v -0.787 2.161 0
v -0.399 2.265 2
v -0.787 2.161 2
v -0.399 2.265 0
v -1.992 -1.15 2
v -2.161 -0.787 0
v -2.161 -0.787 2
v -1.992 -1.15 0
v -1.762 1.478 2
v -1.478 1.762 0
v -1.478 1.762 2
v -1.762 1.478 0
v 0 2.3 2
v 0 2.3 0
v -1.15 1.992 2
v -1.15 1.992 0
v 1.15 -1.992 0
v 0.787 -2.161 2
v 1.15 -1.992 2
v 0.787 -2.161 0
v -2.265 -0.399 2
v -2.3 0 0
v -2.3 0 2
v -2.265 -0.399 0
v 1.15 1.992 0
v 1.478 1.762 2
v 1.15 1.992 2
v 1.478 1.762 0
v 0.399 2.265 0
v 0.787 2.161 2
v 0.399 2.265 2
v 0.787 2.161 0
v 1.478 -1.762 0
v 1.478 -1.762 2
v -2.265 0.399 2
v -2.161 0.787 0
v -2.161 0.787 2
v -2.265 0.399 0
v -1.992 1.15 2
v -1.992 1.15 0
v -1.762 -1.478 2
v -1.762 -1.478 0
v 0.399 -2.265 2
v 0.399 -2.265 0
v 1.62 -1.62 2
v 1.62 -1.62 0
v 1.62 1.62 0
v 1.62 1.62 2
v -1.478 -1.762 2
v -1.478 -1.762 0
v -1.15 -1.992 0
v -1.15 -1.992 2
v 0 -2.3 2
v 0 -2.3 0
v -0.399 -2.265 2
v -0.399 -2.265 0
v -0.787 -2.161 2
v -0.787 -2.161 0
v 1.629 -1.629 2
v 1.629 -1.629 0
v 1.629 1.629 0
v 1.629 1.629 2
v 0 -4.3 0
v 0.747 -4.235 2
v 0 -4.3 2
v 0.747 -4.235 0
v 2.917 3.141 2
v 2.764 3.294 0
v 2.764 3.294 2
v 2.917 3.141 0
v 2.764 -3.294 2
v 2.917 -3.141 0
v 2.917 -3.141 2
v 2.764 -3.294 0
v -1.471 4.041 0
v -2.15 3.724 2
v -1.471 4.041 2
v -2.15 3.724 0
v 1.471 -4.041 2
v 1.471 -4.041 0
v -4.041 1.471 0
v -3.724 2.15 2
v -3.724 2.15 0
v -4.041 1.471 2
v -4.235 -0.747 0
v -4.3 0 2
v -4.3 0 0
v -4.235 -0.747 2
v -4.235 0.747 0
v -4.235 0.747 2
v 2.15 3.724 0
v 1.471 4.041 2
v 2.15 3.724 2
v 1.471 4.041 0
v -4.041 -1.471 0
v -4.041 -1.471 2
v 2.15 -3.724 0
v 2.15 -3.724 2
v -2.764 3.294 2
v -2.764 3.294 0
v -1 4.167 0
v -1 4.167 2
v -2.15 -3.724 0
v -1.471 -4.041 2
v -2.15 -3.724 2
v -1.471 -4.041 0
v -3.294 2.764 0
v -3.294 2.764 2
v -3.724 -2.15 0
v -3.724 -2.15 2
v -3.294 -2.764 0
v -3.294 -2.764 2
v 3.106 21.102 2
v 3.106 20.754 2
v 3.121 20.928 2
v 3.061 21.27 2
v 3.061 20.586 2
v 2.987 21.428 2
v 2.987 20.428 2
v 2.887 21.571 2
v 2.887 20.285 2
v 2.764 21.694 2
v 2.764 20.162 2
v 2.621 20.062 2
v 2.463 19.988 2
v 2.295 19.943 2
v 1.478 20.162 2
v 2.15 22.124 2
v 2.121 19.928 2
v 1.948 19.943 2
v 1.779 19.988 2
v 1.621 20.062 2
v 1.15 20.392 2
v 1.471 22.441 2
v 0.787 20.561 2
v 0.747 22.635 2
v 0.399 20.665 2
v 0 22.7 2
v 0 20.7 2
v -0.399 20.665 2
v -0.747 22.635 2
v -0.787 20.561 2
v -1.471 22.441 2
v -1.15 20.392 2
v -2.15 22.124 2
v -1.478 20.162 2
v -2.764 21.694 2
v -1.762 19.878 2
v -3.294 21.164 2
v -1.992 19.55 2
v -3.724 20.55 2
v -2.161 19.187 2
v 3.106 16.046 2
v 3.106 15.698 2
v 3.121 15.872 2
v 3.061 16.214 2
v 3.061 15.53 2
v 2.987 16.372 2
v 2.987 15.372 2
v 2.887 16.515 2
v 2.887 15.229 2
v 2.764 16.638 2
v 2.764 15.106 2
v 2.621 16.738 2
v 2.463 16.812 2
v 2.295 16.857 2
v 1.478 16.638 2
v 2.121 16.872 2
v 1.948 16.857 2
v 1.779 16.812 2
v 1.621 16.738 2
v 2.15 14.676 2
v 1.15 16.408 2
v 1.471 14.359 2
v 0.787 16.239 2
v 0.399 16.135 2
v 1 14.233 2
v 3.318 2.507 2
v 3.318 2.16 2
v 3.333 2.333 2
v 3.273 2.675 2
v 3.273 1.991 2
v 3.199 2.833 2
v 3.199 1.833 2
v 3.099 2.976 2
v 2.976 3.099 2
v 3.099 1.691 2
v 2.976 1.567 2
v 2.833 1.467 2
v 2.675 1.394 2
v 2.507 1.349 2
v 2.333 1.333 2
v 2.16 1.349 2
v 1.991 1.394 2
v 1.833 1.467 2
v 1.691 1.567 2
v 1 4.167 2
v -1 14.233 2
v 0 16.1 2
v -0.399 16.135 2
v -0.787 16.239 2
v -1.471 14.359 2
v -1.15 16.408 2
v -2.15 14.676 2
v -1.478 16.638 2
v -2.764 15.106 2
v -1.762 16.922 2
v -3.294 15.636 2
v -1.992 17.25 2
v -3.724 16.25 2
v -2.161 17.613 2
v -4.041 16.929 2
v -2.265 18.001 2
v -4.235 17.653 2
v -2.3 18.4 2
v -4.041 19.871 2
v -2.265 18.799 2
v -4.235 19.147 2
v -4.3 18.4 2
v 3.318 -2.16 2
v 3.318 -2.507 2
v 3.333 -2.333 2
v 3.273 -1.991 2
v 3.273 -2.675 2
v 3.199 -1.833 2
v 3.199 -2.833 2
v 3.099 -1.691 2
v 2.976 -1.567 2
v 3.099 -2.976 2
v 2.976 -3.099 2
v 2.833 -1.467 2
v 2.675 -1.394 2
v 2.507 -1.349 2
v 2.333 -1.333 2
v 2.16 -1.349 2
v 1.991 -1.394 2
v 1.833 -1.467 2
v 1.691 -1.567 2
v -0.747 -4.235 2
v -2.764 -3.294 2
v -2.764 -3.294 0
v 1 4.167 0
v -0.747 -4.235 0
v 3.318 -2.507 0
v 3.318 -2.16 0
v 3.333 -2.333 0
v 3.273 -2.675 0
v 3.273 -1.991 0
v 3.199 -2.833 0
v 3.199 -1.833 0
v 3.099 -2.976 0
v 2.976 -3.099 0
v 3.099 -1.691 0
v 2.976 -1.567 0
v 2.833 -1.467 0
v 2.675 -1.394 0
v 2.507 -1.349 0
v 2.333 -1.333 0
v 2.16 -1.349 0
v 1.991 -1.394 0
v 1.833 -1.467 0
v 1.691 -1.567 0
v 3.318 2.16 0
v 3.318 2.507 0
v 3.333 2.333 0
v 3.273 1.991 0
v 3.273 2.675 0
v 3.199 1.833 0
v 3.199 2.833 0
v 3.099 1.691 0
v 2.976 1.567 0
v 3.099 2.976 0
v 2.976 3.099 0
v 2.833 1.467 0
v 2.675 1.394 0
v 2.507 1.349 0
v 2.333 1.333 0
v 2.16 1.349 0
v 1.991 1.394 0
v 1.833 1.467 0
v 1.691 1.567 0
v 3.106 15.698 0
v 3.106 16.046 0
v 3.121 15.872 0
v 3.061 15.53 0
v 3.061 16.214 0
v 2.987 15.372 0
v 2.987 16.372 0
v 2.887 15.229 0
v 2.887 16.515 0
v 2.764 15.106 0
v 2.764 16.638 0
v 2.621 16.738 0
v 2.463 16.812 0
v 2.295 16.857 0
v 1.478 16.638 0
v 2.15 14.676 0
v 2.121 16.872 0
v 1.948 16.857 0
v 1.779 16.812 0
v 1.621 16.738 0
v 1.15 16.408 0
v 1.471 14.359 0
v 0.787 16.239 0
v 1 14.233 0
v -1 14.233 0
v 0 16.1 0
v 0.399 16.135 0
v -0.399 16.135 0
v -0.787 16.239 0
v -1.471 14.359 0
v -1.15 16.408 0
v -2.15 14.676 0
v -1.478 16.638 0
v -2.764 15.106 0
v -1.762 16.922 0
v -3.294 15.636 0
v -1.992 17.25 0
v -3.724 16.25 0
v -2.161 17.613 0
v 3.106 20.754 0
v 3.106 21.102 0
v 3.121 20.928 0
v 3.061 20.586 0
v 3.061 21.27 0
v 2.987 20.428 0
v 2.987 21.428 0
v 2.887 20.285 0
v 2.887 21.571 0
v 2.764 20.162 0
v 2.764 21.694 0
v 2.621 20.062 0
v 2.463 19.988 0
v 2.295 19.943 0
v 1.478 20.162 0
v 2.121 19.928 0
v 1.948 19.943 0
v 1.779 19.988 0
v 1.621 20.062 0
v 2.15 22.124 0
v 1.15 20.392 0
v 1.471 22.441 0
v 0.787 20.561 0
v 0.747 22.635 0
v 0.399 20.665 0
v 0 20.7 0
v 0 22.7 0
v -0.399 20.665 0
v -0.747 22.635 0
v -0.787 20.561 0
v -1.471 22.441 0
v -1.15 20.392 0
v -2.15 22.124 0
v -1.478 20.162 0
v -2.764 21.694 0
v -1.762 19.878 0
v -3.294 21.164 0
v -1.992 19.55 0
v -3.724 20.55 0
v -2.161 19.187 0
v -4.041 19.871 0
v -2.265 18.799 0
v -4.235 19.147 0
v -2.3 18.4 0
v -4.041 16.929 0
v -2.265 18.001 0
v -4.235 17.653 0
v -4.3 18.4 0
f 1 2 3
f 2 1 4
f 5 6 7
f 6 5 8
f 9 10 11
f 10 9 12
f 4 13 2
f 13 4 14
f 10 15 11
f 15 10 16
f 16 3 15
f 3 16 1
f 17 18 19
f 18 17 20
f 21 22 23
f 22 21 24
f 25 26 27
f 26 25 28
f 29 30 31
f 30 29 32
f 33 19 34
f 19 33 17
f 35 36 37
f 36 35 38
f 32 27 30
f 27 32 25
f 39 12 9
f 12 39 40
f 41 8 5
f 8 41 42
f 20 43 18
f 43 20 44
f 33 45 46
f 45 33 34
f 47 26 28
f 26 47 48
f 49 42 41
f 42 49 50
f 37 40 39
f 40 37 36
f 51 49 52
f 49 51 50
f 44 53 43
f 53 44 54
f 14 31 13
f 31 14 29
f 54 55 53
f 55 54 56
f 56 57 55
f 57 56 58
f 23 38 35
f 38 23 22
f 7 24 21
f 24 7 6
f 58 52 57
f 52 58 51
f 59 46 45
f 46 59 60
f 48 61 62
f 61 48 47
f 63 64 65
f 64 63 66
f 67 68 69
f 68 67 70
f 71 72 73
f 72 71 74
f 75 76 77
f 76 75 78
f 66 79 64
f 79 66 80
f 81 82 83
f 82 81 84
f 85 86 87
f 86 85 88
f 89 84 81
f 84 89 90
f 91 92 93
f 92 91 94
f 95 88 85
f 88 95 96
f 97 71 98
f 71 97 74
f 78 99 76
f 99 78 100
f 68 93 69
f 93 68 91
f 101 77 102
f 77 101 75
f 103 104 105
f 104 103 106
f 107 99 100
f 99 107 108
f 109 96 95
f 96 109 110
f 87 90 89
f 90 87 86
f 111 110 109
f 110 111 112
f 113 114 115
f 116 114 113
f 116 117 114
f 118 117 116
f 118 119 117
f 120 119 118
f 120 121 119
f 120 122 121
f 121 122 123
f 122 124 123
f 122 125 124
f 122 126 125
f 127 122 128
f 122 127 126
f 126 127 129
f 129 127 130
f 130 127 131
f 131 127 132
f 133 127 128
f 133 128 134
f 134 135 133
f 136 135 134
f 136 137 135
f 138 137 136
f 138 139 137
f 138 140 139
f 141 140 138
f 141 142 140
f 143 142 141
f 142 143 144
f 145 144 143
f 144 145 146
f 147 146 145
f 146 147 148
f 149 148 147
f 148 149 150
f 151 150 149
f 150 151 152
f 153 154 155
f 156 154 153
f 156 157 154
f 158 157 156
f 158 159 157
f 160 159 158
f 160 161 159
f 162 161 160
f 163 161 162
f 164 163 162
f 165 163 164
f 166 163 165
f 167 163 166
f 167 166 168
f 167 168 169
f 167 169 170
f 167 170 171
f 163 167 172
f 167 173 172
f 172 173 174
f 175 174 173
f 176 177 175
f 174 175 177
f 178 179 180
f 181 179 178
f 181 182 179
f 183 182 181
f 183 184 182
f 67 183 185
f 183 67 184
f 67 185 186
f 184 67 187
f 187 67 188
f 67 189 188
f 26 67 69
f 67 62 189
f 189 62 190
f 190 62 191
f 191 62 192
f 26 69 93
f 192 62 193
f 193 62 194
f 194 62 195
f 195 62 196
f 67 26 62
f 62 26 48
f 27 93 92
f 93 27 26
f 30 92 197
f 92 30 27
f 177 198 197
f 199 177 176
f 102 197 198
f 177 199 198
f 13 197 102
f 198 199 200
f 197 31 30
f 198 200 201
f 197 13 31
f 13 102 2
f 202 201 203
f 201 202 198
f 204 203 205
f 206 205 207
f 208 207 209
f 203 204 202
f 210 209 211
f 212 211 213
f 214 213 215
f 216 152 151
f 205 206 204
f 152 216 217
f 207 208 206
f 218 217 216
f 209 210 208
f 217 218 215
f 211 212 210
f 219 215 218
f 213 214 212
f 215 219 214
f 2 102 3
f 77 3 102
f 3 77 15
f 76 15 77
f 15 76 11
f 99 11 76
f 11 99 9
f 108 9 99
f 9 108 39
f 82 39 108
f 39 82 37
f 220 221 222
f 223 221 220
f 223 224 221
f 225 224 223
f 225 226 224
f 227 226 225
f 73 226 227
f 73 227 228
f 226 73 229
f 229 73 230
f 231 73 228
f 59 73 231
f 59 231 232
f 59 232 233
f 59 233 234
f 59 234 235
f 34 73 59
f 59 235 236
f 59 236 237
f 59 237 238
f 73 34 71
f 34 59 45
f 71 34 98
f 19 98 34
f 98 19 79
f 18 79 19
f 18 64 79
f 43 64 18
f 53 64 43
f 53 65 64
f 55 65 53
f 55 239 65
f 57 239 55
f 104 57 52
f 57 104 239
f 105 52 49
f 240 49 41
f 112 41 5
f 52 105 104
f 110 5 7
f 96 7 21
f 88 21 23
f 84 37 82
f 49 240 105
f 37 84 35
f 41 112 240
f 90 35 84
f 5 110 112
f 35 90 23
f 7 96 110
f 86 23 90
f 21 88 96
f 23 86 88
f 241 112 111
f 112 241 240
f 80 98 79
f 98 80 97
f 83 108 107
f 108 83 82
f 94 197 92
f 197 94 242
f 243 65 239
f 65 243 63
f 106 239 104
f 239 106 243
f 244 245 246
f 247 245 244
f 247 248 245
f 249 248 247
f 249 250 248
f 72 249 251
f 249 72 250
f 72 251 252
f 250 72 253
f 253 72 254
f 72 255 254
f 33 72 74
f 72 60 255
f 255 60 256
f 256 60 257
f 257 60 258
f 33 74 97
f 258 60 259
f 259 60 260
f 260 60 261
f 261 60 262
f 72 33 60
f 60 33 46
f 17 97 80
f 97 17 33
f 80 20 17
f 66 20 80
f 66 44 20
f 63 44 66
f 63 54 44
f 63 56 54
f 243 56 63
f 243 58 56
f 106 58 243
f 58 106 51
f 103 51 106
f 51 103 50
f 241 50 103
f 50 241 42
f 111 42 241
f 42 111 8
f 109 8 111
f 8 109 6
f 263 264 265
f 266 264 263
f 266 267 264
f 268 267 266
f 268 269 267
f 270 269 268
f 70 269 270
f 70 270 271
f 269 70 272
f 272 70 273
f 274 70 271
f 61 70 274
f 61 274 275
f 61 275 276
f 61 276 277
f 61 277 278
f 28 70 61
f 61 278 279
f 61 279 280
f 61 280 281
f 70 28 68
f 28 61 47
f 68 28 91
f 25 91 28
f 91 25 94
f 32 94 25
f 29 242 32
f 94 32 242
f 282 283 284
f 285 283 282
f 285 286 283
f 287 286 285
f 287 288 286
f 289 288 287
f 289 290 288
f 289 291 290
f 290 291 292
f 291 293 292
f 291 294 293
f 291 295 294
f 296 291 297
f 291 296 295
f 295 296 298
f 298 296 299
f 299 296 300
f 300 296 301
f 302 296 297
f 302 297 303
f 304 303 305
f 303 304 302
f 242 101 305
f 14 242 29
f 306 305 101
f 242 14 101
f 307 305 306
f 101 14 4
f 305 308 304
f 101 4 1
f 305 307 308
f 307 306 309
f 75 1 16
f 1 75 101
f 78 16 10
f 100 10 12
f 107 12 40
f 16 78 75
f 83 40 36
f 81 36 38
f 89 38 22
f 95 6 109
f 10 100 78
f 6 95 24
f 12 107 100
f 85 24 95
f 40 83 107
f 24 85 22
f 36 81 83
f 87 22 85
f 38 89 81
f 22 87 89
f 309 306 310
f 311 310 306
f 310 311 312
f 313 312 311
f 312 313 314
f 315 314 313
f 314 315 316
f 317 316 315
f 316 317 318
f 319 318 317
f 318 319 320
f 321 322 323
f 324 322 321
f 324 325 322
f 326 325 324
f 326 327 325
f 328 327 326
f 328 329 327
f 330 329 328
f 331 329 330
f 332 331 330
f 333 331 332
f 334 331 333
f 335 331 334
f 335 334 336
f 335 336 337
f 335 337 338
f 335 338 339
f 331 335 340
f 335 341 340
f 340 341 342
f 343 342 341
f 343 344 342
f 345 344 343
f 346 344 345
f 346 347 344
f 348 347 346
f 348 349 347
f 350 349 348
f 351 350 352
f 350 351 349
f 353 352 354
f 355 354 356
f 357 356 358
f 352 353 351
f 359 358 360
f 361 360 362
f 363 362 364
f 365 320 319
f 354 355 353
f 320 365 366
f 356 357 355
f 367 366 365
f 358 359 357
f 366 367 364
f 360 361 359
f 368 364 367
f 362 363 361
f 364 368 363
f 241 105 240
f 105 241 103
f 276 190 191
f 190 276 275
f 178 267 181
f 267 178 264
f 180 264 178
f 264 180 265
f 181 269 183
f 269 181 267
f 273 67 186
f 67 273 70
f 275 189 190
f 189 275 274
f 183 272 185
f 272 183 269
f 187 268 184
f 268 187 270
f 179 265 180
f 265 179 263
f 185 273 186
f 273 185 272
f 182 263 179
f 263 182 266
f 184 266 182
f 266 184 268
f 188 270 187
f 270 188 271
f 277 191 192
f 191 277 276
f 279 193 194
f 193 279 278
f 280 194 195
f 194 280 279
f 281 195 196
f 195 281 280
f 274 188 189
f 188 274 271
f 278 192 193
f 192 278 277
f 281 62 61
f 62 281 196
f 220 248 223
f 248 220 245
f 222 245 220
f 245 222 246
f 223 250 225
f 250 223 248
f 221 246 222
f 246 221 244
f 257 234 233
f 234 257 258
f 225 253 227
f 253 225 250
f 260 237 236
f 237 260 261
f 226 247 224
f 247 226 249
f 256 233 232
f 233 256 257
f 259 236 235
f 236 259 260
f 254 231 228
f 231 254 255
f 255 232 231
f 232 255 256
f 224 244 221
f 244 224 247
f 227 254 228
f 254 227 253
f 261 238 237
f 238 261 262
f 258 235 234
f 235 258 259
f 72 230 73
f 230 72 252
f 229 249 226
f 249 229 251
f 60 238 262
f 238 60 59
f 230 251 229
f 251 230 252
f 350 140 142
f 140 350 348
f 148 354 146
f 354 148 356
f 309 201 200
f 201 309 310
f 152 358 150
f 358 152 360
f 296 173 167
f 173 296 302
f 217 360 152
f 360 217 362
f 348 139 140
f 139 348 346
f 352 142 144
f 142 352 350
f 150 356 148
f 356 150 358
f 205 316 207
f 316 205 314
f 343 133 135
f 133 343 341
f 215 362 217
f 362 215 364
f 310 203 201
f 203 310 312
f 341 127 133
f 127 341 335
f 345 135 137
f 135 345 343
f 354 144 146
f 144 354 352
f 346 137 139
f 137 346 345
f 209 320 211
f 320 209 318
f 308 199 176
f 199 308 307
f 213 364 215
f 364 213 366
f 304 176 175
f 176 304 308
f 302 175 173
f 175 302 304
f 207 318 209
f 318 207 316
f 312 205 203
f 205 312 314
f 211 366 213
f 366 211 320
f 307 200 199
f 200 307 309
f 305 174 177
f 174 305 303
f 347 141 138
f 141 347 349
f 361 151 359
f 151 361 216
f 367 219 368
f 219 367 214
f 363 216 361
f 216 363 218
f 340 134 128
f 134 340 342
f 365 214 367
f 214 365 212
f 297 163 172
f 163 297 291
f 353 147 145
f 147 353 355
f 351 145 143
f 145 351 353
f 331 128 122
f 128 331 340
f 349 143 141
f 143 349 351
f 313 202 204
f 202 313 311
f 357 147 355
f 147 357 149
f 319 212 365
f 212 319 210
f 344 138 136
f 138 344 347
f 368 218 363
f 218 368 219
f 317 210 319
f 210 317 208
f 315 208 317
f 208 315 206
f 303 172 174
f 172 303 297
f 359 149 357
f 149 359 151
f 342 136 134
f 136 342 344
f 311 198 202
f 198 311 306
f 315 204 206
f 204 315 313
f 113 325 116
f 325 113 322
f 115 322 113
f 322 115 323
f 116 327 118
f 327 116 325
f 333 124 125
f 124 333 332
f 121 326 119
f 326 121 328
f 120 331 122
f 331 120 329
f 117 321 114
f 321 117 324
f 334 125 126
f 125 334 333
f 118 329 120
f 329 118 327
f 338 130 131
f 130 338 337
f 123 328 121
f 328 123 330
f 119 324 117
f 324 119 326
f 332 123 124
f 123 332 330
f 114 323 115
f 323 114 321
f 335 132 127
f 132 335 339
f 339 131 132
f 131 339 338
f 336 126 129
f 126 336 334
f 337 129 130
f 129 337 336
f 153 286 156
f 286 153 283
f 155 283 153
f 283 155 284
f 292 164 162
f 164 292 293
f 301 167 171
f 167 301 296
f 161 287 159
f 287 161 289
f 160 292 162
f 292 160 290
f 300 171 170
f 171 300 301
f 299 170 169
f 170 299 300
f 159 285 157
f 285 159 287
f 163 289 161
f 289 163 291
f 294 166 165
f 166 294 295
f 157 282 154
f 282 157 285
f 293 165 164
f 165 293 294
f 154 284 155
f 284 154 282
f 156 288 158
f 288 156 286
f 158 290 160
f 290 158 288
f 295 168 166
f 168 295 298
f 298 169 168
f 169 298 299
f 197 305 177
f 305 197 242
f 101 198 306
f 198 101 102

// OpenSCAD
// joiner
// @author Ilya Protasov

betweenCenters = 23 - 4.6;
inDiameter = 4.6;
outDiameter = 8.6;
thickness = 2;
barThickness = 2;
barWidth = 2;

$fn = 36;
//Indigo DeepSkyBlue YellowGreen DeepPink OrangeRed LawnGreen DarkSlateBlue Magenta

//function boundDist(blockCount) = cell * blockCount - gap;


module branch1() {
    translate([-thicknessA/2, 0, 0]) cube([thicknessA, radius, height], false);
    translate([0, radius, 0])  cylinder(height, thicknessA/2, thicknessA/2, false);
    translate([0, radius*0.4, 0]) rotate([0, 0, 60]) branch2();
    translate([0, radius*0.4, 0]) rotate([0, 0, -60]) branch2();
}

module clip(thickness, inD, outD, gapAngle) {
    outR = outD/2;
    inR = inD/2;
    centerR = inR + (outR - inR)/2;
    halfA = gapAngle/2;
    
    /*points = [
        [0, 0], 
        [outD * cos(90 + gapAngle/2), -outD * sin(gapAngle/2 + 90)], 
        [-outD * cos(90 +gapAngle/2), -outD * sin(gapAngle/2 + 90)]
    ];*/
    points = [
        [0, 0], 
        [outR * cos(halfA), outR * sin(halfA)], 
        [outR * cos(halfA), -outR * sin(halfA)]
    ];
    x1 = outR * sin(halfA);
    y1 = outR * cos(halfA);
    x2 = x1 * outR / y1;
    // x is changed with y because 0 angle is X-axis
    points2 = [
        [0, 0], 
        [outR, -x2], 
        [outR, x2]
    ];
    difference() {
        cylinder(thickness, outR, outR, false);
        translate([0, 0, -thickness/2]) {
            cylinder(thickness*2, inR, inR, false);
            color("Magenta") linear_extrude(5) polygon(points2);
        }
    }
    roundingR = (outR - inR) / 2;
    translate([centerR * cos(halfA), centerR * sin(halfA)]) 
        cylinder(h = thickness, r = roundingR);//, $fn = 24
    translate([centerR * cos(halfA), -centerR * sin(halfA)]) 
        cylinder(h = thickness, r = roundingR);
    //color("LawnGreen") linear_extrude(10) polygon(points);
    //color("Magenta") linear_extrude(5) polygon(points2);
}

module bar(thickness, length, width, holeD) {
    holeR = holeD / 2;
    difference() {
        translate([-width/2, 0, 0]) 
            cube([width, length, thickness], false);
        union() {
            translate([0, 0, -thickness/2])
                cylinder(h = thickness*2, r = holeR);
            translate([0, length, -thickness/2])
                cylinder(h = thickness*2, r = holeR);
        }
    }
    *translate([0, 0, -thickness/2])
        cylinder(h = thickness*2, r = holeR);
}

module joiner1() {
    //A
    clip(thickness, inDiameter, outDiameter, 90);
    //B
    translate([0, betweenCenters, 0]) 
        clip(thickness, inDiameter, outDiameter, 100);
    bar(barThickness, betweenCenters, barWidth, inDiameter);
}

joiner1();
